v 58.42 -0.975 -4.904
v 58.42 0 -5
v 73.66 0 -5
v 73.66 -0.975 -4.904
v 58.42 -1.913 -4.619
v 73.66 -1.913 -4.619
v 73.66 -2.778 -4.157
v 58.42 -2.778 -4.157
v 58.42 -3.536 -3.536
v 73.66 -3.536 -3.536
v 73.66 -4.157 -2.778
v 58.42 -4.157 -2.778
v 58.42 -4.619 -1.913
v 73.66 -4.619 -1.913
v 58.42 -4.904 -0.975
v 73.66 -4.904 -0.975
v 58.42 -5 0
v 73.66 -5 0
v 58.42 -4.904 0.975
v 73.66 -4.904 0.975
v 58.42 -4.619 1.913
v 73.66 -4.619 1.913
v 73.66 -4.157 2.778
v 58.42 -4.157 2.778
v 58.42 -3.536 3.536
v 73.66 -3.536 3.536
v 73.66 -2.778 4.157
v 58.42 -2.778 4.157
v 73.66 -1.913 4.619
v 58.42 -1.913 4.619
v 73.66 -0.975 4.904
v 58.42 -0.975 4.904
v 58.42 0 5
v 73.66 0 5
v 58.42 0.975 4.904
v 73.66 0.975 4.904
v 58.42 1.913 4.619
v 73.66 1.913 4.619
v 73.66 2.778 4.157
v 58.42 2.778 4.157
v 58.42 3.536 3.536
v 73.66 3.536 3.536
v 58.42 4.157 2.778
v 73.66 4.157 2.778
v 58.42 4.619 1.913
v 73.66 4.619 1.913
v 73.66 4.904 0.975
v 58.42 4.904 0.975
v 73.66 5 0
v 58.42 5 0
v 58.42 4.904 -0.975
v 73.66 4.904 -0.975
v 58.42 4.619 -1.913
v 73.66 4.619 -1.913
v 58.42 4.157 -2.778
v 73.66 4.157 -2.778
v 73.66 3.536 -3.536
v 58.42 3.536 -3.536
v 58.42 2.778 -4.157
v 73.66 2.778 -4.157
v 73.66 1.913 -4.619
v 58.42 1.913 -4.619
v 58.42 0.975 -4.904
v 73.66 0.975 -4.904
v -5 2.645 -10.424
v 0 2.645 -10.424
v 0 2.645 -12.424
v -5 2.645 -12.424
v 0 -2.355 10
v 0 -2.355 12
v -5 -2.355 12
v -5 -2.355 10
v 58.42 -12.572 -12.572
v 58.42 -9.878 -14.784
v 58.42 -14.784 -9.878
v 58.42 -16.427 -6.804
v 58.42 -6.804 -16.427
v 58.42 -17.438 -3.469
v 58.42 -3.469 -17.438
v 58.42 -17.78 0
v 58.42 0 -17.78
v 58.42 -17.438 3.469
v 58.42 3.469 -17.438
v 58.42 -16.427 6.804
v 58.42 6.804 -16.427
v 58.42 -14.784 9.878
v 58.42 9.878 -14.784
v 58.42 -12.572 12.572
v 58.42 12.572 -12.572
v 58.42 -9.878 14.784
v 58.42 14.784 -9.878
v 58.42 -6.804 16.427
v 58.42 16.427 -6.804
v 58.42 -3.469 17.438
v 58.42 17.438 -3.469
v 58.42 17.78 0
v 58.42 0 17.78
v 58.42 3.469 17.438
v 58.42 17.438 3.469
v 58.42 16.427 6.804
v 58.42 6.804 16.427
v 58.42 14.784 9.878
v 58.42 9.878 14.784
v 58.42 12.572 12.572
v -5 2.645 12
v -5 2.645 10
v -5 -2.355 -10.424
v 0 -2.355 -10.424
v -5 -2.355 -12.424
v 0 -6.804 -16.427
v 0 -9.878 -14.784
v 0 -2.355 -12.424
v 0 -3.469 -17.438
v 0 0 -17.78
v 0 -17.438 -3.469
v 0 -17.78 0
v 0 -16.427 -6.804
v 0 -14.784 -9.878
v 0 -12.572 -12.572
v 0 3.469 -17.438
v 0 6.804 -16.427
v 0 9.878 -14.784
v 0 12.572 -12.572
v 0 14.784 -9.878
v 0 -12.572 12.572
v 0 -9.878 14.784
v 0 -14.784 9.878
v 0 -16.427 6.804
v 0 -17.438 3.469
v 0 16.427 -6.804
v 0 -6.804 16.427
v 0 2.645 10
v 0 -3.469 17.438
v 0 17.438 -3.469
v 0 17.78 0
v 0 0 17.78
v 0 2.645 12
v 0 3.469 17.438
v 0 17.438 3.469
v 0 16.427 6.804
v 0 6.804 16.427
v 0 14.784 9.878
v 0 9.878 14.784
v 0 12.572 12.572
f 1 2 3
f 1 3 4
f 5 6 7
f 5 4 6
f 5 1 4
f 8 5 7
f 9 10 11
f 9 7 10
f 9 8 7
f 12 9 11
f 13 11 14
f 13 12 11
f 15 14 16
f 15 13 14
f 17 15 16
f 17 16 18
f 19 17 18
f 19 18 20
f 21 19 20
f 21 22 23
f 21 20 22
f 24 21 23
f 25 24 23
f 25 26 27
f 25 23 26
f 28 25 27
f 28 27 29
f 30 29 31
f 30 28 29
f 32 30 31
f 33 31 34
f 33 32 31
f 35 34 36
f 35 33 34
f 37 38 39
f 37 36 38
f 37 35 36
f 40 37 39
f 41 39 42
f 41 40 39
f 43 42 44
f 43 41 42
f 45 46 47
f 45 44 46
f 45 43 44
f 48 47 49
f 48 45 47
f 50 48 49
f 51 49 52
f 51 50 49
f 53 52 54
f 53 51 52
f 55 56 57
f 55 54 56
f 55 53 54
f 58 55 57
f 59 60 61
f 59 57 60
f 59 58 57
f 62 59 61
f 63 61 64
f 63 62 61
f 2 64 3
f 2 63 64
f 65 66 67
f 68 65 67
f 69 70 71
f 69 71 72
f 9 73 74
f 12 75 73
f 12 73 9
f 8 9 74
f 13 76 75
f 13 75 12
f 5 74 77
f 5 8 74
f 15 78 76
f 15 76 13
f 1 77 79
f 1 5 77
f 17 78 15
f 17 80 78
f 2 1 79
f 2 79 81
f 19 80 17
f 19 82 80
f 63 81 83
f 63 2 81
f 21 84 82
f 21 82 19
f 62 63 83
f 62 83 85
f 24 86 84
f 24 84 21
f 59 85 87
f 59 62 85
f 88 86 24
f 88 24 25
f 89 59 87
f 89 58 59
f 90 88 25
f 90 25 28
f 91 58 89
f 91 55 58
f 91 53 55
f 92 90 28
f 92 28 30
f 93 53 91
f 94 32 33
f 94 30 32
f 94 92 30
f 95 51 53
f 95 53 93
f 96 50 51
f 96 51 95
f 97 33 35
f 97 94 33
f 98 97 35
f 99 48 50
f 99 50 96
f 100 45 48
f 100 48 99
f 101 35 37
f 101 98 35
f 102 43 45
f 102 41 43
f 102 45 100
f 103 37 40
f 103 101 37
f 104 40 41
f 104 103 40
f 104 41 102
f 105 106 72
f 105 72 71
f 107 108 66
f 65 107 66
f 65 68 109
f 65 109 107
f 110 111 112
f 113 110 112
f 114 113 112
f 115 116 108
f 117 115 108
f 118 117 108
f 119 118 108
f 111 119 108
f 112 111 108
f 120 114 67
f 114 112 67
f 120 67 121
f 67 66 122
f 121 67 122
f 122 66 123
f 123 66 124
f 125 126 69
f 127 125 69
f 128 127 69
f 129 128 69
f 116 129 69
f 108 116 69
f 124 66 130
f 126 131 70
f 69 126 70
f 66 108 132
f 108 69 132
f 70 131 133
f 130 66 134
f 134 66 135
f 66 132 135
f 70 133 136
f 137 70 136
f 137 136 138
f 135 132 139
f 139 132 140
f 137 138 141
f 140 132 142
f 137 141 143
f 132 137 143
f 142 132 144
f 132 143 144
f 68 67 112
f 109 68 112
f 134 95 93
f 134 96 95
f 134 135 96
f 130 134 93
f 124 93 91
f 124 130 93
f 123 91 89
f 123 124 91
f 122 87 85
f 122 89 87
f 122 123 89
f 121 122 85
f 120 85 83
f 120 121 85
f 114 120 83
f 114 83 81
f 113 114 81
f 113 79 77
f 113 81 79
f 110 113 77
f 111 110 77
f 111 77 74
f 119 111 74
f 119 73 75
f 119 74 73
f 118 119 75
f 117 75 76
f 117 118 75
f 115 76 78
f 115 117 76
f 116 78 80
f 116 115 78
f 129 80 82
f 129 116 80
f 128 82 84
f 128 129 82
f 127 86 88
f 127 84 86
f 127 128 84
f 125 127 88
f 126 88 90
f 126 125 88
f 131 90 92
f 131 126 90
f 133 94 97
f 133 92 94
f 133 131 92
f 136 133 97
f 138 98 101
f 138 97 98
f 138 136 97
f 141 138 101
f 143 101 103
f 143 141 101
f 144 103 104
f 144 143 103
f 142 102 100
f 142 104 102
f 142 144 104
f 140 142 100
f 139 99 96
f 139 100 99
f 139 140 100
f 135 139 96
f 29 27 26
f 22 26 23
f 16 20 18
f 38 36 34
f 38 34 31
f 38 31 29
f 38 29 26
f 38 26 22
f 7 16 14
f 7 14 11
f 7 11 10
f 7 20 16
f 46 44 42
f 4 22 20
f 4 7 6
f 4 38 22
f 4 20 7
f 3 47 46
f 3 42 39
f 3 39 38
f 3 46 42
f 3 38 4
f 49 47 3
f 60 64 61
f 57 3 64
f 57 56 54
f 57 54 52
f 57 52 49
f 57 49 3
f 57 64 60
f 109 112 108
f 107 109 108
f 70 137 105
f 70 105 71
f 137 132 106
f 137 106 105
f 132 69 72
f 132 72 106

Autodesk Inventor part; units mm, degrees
ref_plane "YZ Plane" through (0, 0, 0) normal (1, 0, 0) x (0, 1, 0)
ref_plane "XZ Plane" through (0, 0, 0) normal (0, 1, 0) x (-1, 0, 0)
ref_plane "XY Plane" through (0, 0, 0) normal (0, 0, 1) x (1, 0, 0)
sketch "Sketch1" plane through (0, 0, 0) normal (1, 0, 0) x (0, 1, 0)
  circle A0 centre (0, 0) radius 17.78
  dimension "d0" = 35.56
extrude "Extrusion1" add sketch "Sketch1" along normal blind 58.42
sketch "Sketch2" plane through (58.42, 0, 0) normal (1, 0, 0) x (0, 0, -1)
  circle A0 centre (0, 0) radius 5
  dimension "d3" = 10
extrude "Extrusion2" add sketch "Sketch2" along normal blind 15.24
sketch "Sketch3" plane through (0, 0, 0) normal (-1, 0, 0) x (0, 0, 1)
  line L0 (0, 0) -> (-10, 0)
  line L1 (0, 0) -> (10, 0)
  line L2 (10, 2.6452) -> (12, 2.6452)
  line L3 (12, 2.6452) -> (12, -2.3548)
  line L4 (12, -2.3548) -> (10, -2.3548)
  line L5 (10, -2.3548) -> (10, 2.6452)
  line L6 (-10.4235, 2.6452) -> (-12.4235, 2.6452)
  line L7 (-12.4235, 2.6452) -> (-12.4235, -2.3548)
  line L8 (-12.4235, -2.3548) -> (-10.4235, -2.3548)
  line L9 (-10.4235, -2.3548) -> (-10.4235, 2.6452)
  dimension "d6" = 10
  dimension "d7" = 10
  dimension "d8" = 2
  dimension "d9" = 2
  dimension "d10" = 5
extrude "Extrusion3" add sketch "Sketch3" along normal blind 5
properties part number "Motor"
